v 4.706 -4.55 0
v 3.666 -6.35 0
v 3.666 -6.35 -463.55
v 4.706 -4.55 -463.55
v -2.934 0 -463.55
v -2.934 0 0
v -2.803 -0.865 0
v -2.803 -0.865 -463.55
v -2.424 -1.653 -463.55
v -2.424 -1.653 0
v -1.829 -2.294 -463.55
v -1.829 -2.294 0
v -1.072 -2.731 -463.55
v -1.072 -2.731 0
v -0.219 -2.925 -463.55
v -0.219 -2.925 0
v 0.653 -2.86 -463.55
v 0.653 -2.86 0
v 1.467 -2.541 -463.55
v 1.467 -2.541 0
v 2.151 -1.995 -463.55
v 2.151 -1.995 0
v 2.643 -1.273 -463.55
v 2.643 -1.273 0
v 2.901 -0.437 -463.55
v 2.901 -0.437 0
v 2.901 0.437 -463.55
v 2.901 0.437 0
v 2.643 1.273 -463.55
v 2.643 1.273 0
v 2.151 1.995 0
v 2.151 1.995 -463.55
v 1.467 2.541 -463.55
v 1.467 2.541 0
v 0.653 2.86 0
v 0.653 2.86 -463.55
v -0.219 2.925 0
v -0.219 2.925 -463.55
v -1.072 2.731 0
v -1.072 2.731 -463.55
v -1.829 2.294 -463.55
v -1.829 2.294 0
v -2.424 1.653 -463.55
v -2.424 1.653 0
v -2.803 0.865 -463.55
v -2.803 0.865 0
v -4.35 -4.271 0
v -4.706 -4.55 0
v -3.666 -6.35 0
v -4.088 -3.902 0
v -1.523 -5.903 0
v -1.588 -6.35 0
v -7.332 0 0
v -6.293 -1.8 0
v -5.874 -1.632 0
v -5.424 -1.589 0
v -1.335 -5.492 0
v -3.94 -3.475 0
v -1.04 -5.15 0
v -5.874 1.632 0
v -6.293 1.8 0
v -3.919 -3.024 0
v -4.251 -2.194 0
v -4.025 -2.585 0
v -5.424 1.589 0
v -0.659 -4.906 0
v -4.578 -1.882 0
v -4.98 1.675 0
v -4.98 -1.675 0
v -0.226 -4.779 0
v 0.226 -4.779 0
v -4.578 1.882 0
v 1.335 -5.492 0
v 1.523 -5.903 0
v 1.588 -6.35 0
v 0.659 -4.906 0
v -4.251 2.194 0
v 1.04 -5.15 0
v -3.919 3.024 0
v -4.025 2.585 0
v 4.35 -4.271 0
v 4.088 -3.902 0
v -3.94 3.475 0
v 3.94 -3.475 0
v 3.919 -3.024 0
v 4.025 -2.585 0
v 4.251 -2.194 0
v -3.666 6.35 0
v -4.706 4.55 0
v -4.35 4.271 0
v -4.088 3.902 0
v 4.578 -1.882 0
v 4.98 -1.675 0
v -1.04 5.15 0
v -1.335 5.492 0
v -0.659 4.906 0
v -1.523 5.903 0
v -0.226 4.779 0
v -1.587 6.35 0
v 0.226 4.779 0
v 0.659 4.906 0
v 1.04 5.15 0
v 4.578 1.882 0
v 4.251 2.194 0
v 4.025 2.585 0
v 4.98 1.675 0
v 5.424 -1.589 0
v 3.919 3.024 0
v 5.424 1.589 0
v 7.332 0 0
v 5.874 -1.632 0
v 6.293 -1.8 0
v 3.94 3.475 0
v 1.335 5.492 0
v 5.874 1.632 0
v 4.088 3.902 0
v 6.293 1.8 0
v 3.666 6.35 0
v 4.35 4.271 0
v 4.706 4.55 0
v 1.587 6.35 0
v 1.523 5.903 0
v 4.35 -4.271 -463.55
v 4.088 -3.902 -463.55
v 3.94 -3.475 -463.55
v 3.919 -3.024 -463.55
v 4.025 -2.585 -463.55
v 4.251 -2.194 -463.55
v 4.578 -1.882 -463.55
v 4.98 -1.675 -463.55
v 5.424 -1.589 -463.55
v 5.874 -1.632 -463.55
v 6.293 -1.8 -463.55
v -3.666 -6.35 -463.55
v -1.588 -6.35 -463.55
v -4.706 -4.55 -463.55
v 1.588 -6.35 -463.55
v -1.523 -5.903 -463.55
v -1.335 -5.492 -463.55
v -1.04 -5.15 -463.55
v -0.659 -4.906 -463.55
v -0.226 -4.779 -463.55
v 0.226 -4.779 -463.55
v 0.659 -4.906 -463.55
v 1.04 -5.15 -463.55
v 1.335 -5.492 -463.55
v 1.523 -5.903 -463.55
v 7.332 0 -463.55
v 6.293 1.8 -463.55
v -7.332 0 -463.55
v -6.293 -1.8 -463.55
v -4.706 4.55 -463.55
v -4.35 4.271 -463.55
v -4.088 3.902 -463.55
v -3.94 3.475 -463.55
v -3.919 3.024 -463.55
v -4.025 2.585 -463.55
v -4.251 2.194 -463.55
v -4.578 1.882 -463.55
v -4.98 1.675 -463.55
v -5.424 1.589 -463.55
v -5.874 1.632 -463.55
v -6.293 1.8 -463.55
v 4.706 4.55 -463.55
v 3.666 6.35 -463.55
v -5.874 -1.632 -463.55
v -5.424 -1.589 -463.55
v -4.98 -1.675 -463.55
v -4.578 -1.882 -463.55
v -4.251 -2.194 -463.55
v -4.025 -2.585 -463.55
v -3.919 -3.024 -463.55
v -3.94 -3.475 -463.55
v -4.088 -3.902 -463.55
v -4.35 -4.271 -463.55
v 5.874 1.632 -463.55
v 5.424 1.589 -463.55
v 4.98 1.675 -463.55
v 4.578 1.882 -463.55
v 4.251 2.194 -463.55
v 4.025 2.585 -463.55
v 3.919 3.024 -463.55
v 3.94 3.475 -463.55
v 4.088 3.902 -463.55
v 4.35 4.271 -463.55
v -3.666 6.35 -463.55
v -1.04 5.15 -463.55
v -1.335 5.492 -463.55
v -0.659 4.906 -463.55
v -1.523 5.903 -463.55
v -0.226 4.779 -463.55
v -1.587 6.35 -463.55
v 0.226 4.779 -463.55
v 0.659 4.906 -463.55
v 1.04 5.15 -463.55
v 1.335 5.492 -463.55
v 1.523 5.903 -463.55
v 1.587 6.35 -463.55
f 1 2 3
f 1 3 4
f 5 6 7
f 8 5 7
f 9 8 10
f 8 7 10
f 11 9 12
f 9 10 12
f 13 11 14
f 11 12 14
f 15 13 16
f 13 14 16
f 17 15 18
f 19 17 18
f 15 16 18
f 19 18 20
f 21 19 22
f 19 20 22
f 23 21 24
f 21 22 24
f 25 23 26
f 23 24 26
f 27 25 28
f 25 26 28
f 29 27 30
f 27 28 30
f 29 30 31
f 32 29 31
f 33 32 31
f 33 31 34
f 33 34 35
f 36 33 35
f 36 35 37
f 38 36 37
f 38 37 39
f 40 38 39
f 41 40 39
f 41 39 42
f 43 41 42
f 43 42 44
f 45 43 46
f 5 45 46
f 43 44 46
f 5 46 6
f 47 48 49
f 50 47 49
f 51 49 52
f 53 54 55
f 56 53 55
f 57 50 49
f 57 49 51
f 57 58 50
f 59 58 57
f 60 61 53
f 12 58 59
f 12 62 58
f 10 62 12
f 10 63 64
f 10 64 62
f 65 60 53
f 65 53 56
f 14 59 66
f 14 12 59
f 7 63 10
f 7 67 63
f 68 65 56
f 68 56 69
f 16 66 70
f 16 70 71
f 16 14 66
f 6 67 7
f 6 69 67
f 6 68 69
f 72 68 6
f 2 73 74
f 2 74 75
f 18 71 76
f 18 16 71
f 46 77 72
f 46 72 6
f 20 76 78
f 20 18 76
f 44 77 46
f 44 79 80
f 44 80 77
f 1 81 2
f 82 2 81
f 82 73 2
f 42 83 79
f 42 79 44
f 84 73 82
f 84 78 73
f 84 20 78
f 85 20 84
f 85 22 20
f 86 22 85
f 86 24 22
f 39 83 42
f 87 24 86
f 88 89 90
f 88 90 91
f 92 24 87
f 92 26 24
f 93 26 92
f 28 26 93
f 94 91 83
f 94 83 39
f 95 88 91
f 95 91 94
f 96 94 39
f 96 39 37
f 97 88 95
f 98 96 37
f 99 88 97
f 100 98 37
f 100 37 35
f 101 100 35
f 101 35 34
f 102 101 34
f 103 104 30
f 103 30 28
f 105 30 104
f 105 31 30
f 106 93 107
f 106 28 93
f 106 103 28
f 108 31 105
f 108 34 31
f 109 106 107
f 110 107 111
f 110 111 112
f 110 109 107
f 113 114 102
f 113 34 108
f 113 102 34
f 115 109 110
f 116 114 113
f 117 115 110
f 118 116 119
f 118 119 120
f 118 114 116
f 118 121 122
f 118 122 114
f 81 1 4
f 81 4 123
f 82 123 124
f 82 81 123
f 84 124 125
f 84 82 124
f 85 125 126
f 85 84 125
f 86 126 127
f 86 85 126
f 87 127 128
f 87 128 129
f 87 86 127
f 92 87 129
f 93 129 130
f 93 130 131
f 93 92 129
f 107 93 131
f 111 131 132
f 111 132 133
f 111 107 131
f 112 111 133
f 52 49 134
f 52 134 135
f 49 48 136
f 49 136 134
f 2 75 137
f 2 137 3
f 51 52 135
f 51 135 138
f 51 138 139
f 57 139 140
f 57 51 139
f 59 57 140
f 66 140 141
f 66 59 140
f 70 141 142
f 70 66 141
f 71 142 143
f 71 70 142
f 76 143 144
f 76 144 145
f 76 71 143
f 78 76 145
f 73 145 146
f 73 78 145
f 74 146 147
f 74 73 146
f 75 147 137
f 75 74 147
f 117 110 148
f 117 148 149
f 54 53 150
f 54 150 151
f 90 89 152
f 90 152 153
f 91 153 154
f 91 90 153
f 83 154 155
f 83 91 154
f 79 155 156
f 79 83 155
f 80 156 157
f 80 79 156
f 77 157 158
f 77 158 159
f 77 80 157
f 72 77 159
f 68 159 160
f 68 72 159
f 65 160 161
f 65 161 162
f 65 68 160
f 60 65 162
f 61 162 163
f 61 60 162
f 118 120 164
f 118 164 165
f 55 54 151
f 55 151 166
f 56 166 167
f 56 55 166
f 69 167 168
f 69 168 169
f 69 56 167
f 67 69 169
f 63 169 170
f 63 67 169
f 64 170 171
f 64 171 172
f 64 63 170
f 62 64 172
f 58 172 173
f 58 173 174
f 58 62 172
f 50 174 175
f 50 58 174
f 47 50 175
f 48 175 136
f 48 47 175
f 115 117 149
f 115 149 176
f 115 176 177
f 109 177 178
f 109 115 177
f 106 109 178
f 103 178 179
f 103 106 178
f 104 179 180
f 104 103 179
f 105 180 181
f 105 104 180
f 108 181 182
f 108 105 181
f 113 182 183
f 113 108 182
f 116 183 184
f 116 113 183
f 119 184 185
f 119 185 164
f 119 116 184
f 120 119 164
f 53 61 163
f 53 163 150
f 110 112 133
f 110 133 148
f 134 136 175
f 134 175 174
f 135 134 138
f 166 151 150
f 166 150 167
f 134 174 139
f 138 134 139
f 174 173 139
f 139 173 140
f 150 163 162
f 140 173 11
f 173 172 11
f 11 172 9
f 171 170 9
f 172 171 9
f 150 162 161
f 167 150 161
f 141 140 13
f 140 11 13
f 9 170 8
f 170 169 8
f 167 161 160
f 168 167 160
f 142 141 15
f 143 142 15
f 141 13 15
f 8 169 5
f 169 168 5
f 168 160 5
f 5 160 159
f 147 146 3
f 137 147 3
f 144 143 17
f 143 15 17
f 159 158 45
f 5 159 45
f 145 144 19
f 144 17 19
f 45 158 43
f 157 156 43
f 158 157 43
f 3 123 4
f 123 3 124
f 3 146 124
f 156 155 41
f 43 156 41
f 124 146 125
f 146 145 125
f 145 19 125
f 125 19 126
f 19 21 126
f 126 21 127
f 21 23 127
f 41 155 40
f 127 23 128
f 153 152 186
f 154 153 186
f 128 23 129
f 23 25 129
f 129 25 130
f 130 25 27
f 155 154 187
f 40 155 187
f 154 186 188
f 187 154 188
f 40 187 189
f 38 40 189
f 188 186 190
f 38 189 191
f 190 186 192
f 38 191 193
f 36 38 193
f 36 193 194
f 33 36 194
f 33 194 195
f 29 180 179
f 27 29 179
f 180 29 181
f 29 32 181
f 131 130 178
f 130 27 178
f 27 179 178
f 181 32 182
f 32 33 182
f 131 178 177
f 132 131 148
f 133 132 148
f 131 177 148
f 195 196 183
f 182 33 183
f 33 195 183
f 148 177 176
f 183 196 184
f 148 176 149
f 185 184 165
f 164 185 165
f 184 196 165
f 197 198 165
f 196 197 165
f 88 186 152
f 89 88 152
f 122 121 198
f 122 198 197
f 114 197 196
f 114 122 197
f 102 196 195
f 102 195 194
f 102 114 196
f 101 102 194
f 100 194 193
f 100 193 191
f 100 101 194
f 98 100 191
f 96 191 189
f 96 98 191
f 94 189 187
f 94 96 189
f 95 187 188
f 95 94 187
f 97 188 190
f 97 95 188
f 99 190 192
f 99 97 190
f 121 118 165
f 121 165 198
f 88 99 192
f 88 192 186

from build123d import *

# Parameters (mm, degrees)
SKETCH1_R           = 2.9337
BOSS_EXTRUDE1_DEPTH = 463.55


with BuildPart() as part:
    # Sketch1 → Boss-Extrude1 (new body)
    with BuildSketch(Plane.XY):
        with BuildLine():
            Line((-4.70551159, -4.549815043), (-3.666174521, -6.349999904))
            Line((-3.666174521, -6.349999904), (-1.587501154, -6.349999904))
            ThreePointArc((-1.587501154, -6.349999904), (-3.85e-07, -4.762499134), (1.587501154, -6.349999904))
            Line((1.587501154, -6.349999904), (3.666173825, -6.349999904))
            Line((3.666173825, -6.349999904), (4.705510929, -4.549815232))
            ThreePointArc((4.705510929, -4.549815232), (4.124445601, -2.381249904), (6.293010929, -1.800184575))
            Line((6.293010929, -1.800184575), (7.332348034, 9.6e-08))
            Line((7.332348034, 9.6e-08), (6.293011178, 1.800184715))
            ThreePointArc((6.293011178, 1.800184715), (4.124445902, 2.381250241), (4.705511428, 4.549815516))
            Line((4.705511428, 4.549815516), (3.666174521, 6.350000222))
            Line((3.666174521, 6.350000222), (1.587498846, 6.350000222))
            ThreePointArc((1.587498846, 6.350000222), (3.85e-07, 4.762501761), (-1.587498846, 6.350000222))
            Line((-1.587498846, 6.350000222), (-3.666173825, 6.350000222))
            Line((-3.666173825, 6.350000222), (-4.705511038, 4.549815614))
            ThreePointArc((-4.705511038, 4.549815614), (-4.124445841, 2.38125025), (-6.293011205, 1.800185053))
            Line((-6.293011205, 1.800185053), (-7.332348419, 4.44e-07))
            Line((-7.332348419, 4.44e-07), (-6.293011423, -1.80018429))
            ThreePointArc((-6.293011423, -1.80018429), (-4.12444613, -2.38124975), (-4.70551159, -4.549815043))
        make_face()
        with Locations(Location((0, 0, 0), (0, 0, 180))):
            Circle(SKETCH1_R, mode=Mode.SUBTRACT)
    extrude(amount=-BOSS_EXTRUDE1_DEPTH)


solid = part.part
